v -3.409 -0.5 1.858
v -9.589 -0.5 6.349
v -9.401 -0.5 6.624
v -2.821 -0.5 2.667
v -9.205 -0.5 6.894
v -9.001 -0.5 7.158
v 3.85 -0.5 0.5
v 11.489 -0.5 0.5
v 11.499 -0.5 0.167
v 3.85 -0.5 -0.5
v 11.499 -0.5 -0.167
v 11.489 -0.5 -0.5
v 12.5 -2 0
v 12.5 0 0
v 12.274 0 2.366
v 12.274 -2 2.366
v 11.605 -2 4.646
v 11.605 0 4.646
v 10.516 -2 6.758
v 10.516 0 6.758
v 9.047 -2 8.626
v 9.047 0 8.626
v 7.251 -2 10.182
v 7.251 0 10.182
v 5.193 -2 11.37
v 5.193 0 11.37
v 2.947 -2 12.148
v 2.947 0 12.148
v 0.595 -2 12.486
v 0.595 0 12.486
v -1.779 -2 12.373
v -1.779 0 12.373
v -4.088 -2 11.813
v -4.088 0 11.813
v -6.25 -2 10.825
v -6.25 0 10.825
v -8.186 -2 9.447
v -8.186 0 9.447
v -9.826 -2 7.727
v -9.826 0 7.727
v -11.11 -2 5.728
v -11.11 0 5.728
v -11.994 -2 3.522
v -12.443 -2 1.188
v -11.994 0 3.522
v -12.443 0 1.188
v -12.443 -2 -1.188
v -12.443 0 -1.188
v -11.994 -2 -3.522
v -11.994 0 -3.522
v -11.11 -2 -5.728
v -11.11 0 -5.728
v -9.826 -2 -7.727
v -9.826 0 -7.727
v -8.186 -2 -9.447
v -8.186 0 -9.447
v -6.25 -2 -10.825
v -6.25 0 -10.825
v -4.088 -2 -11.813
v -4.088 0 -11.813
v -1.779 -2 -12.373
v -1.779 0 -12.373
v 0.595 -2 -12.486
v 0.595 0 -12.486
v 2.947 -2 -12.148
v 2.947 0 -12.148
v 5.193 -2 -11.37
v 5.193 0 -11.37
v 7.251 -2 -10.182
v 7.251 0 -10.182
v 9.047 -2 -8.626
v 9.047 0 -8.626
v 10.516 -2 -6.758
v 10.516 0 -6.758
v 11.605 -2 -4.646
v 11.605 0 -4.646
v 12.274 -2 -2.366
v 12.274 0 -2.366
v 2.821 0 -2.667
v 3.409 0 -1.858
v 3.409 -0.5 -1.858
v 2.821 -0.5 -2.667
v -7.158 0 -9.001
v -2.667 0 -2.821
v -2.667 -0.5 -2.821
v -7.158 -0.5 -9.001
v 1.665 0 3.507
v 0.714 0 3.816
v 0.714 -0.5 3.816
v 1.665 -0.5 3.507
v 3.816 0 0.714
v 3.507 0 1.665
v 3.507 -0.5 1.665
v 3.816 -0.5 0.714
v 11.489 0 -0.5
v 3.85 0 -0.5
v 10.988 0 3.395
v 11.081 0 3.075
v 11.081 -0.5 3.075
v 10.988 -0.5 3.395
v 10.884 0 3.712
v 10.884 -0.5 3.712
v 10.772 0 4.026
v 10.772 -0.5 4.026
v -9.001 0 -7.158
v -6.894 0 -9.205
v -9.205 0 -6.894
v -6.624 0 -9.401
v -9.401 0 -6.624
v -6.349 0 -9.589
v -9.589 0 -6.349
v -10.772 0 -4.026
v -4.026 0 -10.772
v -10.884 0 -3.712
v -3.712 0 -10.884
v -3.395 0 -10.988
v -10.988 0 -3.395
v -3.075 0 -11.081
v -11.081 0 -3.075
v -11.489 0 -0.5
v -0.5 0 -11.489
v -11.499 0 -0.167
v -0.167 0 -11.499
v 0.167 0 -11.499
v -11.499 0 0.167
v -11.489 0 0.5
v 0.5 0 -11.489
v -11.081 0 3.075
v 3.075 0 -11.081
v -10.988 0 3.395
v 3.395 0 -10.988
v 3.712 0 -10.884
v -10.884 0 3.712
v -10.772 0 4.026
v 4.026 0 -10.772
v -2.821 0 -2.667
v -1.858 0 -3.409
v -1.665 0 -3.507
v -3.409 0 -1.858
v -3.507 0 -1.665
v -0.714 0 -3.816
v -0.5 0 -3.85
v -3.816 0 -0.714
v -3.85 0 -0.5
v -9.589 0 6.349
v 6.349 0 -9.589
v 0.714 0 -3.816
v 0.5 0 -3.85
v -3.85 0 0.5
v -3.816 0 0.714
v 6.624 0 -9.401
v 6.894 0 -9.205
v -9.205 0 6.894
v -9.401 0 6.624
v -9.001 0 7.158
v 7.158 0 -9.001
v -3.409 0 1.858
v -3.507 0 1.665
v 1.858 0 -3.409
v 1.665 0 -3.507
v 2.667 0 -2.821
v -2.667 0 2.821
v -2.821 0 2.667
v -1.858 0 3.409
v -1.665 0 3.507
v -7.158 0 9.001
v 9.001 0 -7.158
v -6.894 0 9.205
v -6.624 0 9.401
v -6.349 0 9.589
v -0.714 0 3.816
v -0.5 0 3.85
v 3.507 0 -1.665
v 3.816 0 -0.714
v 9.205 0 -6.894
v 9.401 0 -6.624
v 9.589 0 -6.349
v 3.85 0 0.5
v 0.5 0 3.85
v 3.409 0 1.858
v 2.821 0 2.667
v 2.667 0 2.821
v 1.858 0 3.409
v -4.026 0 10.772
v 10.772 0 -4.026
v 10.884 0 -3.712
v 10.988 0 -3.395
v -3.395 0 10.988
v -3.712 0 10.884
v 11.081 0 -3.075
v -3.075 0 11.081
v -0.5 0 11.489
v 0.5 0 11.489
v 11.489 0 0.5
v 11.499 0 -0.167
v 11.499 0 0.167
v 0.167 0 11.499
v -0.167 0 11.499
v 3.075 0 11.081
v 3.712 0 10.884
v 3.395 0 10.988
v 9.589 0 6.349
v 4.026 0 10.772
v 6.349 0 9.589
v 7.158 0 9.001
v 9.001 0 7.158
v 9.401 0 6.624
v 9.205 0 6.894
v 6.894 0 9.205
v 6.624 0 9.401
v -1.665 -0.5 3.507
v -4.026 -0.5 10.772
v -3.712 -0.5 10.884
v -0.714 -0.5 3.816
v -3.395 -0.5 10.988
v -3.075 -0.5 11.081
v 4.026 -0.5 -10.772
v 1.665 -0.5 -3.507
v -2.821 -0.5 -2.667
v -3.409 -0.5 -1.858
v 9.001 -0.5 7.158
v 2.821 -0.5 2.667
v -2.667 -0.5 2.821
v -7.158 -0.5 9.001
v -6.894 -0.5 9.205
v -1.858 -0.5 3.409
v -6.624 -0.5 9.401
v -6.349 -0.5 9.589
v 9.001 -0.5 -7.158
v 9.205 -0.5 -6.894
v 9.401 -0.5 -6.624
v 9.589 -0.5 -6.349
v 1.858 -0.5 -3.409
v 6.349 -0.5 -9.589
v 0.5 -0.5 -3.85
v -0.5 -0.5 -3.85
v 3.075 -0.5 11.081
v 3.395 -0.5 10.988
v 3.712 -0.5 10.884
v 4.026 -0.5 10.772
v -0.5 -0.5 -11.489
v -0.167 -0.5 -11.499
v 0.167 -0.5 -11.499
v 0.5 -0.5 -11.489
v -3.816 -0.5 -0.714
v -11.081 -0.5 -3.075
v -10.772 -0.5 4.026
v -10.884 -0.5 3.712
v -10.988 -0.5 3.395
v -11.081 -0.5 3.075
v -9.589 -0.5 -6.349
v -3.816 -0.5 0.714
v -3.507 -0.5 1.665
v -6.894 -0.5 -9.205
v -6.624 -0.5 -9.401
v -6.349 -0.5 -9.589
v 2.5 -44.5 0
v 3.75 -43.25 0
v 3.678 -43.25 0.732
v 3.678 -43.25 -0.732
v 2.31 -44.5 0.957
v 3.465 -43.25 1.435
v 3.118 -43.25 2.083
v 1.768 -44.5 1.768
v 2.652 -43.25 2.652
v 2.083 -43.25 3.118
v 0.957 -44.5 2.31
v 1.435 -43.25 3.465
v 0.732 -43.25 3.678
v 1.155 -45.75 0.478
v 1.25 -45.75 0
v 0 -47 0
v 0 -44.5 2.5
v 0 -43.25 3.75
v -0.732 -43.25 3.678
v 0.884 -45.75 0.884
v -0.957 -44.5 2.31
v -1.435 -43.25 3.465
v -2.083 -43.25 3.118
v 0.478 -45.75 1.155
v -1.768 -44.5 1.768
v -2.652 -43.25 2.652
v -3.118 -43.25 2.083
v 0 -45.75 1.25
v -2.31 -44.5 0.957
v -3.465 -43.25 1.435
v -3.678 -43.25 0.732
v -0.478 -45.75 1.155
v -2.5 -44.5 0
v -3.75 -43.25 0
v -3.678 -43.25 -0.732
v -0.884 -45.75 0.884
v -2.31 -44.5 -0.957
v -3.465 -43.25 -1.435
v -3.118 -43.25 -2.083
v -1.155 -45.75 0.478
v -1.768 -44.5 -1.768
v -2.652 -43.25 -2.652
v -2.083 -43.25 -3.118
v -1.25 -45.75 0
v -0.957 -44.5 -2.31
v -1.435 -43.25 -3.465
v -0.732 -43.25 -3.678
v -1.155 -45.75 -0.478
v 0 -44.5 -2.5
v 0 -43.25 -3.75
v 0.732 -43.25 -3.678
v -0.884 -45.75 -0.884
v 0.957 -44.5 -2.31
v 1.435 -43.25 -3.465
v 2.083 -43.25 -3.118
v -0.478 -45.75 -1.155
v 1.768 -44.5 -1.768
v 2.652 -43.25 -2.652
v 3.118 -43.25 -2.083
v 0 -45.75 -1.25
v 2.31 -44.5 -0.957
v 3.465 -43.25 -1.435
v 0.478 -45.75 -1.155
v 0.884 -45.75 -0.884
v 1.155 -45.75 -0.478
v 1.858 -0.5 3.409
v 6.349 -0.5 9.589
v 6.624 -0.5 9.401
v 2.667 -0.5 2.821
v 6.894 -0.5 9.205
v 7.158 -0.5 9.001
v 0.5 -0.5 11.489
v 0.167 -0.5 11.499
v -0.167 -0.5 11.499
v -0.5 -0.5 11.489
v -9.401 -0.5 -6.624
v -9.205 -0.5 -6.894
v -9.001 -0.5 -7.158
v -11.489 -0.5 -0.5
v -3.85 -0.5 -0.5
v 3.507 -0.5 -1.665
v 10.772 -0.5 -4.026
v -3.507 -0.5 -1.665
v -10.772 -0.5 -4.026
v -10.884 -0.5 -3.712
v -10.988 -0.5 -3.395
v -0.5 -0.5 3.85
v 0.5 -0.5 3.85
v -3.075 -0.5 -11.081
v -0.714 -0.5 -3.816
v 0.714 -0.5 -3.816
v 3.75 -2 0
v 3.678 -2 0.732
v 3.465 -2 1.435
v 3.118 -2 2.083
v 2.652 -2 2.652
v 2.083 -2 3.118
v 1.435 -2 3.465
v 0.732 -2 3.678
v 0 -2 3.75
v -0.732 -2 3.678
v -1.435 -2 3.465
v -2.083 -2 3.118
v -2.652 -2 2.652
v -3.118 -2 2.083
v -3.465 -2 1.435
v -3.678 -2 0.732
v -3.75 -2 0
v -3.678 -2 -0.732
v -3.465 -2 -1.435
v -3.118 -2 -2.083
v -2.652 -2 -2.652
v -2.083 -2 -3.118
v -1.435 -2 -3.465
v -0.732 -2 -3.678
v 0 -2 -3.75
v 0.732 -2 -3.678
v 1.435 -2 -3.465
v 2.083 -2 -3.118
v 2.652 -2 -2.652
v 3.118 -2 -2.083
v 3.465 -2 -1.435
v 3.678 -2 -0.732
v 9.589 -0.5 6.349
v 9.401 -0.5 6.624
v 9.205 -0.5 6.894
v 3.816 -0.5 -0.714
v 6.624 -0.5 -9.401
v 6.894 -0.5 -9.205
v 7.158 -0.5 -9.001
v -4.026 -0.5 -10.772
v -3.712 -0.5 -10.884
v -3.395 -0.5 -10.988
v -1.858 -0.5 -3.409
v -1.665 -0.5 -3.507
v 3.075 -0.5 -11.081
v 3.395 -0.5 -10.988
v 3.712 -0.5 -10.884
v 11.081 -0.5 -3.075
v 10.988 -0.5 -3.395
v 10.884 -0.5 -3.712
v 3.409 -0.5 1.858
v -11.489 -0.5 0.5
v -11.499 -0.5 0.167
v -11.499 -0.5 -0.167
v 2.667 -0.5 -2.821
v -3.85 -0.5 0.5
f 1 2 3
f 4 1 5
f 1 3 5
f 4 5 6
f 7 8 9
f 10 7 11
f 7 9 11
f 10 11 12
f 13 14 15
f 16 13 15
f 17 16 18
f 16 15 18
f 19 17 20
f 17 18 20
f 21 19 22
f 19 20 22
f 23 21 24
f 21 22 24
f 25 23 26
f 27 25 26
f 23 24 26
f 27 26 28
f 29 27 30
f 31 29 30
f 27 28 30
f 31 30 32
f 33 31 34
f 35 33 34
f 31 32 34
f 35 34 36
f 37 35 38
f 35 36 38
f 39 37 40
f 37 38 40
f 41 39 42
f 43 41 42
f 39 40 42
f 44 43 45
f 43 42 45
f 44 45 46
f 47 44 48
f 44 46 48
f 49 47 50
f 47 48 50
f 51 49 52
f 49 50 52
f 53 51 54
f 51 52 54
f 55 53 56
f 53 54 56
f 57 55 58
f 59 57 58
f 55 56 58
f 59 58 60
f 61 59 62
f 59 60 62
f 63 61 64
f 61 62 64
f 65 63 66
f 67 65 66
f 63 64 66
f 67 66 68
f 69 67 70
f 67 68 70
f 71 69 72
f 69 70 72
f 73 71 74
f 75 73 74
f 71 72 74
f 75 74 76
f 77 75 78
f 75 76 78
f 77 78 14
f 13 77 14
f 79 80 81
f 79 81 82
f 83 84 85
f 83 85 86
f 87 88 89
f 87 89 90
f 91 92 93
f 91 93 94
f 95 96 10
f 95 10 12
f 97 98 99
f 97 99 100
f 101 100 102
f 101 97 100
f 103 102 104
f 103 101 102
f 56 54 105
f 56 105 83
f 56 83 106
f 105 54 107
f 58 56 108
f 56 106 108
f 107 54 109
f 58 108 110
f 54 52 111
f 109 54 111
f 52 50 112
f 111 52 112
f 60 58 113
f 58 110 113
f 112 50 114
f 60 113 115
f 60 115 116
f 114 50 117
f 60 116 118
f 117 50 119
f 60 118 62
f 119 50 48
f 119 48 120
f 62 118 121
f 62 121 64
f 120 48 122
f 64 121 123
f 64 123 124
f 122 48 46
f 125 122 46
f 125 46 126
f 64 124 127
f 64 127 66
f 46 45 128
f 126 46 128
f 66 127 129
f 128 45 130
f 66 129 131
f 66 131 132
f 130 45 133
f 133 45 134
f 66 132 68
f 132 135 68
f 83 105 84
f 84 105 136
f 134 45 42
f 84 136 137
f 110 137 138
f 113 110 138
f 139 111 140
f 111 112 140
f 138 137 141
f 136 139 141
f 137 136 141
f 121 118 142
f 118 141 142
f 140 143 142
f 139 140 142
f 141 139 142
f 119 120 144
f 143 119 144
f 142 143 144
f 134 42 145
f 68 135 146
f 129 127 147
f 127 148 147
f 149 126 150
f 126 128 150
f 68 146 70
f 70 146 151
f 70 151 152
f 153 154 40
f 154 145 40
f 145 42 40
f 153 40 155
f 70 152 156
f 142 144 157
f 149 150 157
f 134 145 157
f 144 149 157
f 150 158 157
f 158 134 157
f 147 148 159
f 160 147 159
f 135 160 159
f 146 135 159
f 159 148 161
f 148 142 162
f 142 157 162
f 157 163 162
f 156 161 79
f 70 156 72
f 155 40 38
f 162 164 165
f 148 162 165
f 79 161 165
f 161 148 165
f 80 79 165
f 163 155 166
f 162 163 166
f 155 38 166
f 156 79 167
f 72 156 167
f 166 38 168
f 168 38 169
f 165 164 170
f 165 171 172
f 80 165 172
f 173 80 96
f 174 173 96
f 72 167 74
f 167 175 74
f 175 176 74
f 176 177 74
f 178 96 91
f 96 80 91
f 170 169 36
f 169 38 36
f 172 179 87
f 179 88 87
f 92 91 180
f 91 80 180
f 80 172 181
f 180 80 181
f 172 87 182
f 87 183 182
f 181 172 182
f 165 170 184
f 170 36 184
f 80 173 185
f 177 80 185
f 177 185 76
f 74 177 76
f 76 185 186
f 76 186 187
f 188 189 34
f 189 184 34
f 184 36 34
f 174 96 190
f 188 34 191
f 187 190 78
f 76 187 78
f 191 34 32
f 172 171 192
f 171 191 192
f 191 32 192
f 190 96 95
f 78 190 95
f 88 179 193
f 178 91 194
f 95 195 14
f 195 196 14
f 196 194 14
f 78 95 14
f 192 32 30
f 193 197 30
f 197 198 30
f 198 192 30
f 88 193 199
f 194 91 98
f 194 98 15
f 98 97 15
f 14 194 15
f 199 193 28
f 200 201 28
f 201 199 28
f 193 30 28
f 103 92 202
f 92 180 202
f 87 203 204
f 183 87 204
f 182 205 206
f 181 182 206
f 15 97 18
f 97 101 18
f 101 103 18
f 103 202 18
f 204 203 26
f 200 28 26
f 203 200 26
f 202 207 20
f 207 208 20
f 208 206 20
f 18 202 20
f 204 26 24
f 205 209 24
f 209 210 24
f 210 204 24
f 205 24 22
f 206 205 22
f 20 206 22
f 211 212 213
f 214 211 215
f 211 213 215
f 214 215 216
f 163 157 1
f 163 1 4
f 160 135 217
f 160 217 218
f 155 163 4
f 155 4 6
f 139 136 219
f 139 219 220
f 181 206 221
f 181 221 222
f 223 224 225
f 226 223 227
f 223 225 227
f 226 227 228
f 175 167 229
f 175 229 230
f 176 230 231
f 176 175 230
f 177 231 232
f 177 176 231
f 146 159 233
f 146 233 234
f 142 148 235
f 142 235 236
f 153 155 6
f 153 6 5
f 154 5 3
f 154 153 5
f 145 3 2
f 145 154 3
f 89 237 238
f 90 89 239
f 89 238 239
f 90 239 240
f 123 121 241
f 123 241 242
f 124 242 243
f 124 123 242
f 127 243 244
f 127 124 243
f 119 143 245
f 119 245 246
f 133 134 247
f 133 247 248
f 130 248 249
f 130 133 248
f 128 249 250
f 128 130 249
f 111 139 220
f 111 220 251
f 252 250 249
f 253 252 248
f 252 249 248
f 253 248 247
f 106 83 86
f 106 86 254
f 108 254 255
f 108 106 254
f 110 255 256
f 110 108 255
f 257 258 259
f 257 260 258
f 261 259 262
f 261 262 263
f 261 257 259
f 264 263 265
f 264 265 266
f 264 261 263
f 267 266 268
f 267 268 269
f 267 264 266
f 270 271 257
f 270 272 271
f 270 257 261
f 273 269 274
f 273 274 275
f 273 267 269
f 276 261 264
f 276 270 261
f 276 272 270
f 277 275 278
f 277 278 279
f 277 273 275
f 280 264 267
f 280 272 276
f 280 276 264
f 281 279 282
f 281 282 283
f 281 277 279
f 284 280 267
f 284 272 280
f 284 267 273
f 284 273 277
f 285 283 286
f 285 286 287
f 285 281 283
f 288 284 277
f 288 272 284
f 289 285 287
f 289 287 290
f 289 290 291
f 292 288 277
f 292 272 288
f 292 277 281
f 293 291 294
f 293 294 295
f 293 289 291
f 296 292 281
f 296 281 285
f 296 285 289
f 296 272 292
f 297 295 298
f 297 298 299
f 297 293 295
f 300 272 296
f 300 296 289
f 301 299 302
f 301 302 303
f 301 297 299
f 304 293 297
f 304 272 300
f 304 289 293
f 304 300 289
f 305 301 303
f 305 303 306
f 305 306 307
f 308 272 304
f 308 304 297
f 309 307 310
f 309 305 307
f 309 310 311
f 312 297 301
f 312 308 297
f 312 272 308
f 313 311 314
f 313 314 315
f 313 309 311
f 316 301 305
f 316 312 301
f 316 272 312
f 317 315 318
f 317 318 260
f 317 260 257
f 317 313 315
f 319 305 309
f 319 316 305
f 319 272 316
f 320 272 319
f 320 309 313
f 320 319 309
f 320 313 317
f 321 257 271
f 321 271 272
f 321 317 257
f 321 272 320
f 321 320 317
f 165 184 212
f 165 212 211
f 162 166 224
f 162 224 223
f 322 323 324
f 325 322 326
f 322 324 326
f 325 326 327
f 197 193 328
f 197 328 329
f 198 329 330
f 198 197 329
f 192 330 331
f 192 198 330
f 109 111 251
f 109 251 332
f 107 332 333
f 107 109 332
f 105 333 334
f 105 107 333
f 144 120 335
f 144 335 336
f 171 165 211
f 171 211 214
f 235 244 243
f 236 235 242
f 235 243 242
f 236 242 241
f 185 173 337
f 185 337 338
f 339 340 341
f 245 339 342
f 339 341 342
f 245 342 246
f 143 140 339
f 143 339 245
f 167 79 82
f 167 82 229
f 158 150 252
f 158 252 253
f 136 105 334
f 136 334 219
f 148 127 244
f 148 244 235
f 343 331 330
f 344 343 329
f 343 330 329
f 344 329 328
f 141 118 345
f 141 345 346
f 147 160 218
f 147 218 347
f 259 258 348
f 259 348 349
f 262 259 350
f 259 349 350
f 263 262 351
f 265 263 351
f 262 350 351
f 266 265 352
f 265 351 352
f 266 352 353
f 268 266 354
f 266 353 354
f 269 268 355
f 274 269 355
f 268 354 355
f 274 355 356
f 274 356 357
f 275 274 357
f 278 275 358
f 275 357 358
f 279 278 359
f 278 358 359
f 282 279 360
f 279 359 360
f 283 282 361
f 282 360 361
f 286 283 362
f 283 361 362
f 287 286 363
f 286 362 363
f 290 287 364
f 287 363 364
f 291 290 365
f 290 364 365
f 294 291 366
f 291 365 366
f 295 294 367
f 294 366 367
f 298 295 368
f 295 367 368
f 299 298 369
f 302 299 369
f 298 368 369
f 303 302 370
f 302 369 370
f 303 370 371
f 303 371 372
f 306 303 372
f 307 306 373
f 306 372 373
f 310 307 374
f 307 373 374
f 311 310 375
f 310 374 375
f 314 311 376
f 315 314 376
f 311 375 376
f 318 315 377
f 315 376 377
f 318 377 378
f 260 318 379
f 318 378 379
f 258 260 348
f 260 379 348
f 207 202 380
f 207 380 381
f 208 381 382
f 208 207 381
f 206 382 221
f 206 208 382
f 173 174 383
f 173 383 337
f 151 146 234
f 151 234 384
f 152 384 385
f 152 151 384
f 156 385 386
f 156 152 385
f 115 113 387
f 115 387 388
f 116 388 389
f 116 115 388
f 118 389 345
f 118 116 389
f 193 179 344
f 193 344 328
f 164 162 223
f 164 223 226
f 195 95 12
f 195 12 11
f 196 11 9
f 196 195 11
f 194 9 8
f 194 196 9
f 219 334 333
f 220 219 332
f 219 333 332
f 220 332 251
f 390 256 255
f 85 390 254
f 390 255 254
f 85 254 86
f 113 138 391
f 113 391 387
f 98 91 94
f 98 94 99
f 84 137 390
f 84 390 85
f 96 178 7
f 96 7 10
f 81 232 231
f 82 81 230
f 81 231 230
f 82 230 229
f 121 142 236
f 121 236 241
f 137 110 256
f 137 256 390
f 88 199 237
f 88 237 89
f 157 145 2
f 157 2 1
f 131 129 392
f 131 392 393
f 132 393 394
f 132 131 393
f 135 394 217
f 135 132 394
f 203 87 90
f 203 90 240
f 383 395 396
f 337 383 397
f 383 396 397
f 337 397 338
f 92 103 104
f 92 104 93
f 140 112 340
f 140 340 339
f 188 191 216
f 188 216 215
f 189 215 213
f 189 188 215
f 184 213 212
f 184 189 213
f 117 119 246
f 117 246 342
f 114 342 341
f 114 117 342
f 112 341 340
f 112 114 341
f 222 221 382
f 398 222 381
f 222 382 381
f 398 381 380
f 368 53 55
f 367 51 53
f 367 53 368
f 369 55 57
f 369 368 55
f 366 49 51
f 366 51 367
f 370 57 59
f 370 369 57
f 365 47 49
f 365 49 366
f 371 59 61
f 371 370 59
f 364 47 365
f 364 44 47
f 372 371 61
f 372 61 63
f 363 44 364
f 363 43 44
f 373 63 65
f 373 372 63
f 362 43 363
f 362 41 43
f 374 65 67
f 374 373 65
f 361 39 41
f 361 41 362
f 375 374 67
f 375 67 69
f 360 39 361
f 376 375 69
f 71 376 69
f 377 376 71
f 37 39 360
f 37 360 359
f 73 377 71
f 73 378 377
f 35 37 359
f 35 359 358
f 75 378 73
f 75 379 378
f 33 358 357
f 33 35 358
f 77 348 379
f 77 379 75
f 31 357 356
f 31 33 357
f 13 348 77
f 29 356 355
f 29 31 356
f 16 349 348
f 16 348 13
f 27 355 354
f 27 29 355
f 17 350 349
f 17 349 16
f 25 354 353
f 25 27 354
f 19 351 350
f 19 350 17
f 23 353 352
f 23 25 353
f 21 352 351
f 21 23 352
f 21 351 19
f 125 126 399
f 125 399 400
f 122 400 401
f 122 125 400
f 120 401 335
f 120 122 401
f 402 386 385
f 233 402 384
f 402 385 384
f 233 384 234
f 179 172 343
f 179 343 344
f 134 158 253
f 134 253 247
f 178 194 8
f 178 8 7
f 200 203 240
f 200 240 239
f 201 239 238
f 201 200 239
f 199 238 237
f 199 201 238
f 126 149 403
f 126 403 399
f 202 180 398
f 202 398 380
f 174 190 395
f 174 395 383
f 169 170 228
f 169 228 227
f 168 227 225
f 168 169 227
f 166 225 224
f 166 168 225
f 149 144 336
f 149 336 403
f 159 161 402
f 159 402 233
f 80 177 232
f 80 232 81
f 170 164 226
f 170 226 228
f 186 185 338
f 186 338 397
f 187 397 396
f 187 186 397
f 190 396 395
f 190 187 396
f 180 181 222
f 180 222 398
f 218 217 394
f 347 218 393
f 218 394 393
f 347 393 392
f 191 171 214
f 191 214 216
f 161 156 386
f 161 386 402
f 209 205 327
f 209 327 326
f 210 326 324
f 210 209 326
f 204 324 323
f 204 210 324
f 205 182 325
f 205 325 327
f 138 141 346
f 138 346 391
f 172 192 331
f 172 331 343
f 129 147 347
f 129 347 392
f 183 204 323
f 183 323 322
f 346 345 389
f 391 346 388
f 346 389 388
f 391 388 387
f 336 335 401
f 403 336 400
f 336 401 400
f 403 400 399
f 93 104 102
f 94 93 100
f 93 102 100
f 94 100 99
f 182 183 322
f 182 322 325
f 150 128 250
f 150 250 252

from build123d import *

# Parameters (mm, degrees)
F0_R            = 12.5
F1_DEPTH        = 2
F2_R            = 3.75
F3_DEPTH        = 45
F4_SIZE         = 3.75
F7_DEPTH        = 0.5
F7_COPIES_COUNT = 20


# Not quite as in the source:
# - a pattern or mirror of a feature is missing from the dataset's text; its kind, count and spacing are read off the source's solid


with BuildPart() as f1:
    # F0 (on Front) → F1 (new body)
    with BuildSketch(Plane.XZ):
        Circle(F0_R)
    extrude(amount=F1_DEPTH)

    # F2 (on face) → F3 (join)
    with BuildSketch(Plane.XZ.offset(2)):
        Circle(F2_R)
    extrude(amount=F3_DEPTH)

    # F4
    f4_edges = [f1.edges().sort_by_distance(p)[0] for p in [
        (-3.75, -47, 0),
    ]]
    chamfer(f4_edges, length=F4_SIZE)

    # F6 (on Front) → F7 (cut)
    with BuildSketch(Plane.XZ):
        with BuildLine():
            Line((-0.5, 3.85), (0.5, 3.85))
            Line((0.5, 3.85), (0.5, 11.4891252931))
            ThreePointArc((0.5, 11.4891252931), (0, 11.5), (-0.5, 11.4891252931))
            Line((-0.5, 11.4891252931), (-0.5, 3.85))
        make_face()
    f7 = extrude(amount=F7_DEPTH, mode=Mode.SUBTRACT)

    # F7_copies: F7 ×20 about axis
    f7_copies_axis = Axis((0, 0, 0), (0, 1, 0))
    for i in range(1, F7_COPIES_COUNT):
        add(f7.rotate(f7_copies_axis, i * 360 / F7_COPIES_COUNT), mode=Mode.SUBTRACT)


solid = f1.part
